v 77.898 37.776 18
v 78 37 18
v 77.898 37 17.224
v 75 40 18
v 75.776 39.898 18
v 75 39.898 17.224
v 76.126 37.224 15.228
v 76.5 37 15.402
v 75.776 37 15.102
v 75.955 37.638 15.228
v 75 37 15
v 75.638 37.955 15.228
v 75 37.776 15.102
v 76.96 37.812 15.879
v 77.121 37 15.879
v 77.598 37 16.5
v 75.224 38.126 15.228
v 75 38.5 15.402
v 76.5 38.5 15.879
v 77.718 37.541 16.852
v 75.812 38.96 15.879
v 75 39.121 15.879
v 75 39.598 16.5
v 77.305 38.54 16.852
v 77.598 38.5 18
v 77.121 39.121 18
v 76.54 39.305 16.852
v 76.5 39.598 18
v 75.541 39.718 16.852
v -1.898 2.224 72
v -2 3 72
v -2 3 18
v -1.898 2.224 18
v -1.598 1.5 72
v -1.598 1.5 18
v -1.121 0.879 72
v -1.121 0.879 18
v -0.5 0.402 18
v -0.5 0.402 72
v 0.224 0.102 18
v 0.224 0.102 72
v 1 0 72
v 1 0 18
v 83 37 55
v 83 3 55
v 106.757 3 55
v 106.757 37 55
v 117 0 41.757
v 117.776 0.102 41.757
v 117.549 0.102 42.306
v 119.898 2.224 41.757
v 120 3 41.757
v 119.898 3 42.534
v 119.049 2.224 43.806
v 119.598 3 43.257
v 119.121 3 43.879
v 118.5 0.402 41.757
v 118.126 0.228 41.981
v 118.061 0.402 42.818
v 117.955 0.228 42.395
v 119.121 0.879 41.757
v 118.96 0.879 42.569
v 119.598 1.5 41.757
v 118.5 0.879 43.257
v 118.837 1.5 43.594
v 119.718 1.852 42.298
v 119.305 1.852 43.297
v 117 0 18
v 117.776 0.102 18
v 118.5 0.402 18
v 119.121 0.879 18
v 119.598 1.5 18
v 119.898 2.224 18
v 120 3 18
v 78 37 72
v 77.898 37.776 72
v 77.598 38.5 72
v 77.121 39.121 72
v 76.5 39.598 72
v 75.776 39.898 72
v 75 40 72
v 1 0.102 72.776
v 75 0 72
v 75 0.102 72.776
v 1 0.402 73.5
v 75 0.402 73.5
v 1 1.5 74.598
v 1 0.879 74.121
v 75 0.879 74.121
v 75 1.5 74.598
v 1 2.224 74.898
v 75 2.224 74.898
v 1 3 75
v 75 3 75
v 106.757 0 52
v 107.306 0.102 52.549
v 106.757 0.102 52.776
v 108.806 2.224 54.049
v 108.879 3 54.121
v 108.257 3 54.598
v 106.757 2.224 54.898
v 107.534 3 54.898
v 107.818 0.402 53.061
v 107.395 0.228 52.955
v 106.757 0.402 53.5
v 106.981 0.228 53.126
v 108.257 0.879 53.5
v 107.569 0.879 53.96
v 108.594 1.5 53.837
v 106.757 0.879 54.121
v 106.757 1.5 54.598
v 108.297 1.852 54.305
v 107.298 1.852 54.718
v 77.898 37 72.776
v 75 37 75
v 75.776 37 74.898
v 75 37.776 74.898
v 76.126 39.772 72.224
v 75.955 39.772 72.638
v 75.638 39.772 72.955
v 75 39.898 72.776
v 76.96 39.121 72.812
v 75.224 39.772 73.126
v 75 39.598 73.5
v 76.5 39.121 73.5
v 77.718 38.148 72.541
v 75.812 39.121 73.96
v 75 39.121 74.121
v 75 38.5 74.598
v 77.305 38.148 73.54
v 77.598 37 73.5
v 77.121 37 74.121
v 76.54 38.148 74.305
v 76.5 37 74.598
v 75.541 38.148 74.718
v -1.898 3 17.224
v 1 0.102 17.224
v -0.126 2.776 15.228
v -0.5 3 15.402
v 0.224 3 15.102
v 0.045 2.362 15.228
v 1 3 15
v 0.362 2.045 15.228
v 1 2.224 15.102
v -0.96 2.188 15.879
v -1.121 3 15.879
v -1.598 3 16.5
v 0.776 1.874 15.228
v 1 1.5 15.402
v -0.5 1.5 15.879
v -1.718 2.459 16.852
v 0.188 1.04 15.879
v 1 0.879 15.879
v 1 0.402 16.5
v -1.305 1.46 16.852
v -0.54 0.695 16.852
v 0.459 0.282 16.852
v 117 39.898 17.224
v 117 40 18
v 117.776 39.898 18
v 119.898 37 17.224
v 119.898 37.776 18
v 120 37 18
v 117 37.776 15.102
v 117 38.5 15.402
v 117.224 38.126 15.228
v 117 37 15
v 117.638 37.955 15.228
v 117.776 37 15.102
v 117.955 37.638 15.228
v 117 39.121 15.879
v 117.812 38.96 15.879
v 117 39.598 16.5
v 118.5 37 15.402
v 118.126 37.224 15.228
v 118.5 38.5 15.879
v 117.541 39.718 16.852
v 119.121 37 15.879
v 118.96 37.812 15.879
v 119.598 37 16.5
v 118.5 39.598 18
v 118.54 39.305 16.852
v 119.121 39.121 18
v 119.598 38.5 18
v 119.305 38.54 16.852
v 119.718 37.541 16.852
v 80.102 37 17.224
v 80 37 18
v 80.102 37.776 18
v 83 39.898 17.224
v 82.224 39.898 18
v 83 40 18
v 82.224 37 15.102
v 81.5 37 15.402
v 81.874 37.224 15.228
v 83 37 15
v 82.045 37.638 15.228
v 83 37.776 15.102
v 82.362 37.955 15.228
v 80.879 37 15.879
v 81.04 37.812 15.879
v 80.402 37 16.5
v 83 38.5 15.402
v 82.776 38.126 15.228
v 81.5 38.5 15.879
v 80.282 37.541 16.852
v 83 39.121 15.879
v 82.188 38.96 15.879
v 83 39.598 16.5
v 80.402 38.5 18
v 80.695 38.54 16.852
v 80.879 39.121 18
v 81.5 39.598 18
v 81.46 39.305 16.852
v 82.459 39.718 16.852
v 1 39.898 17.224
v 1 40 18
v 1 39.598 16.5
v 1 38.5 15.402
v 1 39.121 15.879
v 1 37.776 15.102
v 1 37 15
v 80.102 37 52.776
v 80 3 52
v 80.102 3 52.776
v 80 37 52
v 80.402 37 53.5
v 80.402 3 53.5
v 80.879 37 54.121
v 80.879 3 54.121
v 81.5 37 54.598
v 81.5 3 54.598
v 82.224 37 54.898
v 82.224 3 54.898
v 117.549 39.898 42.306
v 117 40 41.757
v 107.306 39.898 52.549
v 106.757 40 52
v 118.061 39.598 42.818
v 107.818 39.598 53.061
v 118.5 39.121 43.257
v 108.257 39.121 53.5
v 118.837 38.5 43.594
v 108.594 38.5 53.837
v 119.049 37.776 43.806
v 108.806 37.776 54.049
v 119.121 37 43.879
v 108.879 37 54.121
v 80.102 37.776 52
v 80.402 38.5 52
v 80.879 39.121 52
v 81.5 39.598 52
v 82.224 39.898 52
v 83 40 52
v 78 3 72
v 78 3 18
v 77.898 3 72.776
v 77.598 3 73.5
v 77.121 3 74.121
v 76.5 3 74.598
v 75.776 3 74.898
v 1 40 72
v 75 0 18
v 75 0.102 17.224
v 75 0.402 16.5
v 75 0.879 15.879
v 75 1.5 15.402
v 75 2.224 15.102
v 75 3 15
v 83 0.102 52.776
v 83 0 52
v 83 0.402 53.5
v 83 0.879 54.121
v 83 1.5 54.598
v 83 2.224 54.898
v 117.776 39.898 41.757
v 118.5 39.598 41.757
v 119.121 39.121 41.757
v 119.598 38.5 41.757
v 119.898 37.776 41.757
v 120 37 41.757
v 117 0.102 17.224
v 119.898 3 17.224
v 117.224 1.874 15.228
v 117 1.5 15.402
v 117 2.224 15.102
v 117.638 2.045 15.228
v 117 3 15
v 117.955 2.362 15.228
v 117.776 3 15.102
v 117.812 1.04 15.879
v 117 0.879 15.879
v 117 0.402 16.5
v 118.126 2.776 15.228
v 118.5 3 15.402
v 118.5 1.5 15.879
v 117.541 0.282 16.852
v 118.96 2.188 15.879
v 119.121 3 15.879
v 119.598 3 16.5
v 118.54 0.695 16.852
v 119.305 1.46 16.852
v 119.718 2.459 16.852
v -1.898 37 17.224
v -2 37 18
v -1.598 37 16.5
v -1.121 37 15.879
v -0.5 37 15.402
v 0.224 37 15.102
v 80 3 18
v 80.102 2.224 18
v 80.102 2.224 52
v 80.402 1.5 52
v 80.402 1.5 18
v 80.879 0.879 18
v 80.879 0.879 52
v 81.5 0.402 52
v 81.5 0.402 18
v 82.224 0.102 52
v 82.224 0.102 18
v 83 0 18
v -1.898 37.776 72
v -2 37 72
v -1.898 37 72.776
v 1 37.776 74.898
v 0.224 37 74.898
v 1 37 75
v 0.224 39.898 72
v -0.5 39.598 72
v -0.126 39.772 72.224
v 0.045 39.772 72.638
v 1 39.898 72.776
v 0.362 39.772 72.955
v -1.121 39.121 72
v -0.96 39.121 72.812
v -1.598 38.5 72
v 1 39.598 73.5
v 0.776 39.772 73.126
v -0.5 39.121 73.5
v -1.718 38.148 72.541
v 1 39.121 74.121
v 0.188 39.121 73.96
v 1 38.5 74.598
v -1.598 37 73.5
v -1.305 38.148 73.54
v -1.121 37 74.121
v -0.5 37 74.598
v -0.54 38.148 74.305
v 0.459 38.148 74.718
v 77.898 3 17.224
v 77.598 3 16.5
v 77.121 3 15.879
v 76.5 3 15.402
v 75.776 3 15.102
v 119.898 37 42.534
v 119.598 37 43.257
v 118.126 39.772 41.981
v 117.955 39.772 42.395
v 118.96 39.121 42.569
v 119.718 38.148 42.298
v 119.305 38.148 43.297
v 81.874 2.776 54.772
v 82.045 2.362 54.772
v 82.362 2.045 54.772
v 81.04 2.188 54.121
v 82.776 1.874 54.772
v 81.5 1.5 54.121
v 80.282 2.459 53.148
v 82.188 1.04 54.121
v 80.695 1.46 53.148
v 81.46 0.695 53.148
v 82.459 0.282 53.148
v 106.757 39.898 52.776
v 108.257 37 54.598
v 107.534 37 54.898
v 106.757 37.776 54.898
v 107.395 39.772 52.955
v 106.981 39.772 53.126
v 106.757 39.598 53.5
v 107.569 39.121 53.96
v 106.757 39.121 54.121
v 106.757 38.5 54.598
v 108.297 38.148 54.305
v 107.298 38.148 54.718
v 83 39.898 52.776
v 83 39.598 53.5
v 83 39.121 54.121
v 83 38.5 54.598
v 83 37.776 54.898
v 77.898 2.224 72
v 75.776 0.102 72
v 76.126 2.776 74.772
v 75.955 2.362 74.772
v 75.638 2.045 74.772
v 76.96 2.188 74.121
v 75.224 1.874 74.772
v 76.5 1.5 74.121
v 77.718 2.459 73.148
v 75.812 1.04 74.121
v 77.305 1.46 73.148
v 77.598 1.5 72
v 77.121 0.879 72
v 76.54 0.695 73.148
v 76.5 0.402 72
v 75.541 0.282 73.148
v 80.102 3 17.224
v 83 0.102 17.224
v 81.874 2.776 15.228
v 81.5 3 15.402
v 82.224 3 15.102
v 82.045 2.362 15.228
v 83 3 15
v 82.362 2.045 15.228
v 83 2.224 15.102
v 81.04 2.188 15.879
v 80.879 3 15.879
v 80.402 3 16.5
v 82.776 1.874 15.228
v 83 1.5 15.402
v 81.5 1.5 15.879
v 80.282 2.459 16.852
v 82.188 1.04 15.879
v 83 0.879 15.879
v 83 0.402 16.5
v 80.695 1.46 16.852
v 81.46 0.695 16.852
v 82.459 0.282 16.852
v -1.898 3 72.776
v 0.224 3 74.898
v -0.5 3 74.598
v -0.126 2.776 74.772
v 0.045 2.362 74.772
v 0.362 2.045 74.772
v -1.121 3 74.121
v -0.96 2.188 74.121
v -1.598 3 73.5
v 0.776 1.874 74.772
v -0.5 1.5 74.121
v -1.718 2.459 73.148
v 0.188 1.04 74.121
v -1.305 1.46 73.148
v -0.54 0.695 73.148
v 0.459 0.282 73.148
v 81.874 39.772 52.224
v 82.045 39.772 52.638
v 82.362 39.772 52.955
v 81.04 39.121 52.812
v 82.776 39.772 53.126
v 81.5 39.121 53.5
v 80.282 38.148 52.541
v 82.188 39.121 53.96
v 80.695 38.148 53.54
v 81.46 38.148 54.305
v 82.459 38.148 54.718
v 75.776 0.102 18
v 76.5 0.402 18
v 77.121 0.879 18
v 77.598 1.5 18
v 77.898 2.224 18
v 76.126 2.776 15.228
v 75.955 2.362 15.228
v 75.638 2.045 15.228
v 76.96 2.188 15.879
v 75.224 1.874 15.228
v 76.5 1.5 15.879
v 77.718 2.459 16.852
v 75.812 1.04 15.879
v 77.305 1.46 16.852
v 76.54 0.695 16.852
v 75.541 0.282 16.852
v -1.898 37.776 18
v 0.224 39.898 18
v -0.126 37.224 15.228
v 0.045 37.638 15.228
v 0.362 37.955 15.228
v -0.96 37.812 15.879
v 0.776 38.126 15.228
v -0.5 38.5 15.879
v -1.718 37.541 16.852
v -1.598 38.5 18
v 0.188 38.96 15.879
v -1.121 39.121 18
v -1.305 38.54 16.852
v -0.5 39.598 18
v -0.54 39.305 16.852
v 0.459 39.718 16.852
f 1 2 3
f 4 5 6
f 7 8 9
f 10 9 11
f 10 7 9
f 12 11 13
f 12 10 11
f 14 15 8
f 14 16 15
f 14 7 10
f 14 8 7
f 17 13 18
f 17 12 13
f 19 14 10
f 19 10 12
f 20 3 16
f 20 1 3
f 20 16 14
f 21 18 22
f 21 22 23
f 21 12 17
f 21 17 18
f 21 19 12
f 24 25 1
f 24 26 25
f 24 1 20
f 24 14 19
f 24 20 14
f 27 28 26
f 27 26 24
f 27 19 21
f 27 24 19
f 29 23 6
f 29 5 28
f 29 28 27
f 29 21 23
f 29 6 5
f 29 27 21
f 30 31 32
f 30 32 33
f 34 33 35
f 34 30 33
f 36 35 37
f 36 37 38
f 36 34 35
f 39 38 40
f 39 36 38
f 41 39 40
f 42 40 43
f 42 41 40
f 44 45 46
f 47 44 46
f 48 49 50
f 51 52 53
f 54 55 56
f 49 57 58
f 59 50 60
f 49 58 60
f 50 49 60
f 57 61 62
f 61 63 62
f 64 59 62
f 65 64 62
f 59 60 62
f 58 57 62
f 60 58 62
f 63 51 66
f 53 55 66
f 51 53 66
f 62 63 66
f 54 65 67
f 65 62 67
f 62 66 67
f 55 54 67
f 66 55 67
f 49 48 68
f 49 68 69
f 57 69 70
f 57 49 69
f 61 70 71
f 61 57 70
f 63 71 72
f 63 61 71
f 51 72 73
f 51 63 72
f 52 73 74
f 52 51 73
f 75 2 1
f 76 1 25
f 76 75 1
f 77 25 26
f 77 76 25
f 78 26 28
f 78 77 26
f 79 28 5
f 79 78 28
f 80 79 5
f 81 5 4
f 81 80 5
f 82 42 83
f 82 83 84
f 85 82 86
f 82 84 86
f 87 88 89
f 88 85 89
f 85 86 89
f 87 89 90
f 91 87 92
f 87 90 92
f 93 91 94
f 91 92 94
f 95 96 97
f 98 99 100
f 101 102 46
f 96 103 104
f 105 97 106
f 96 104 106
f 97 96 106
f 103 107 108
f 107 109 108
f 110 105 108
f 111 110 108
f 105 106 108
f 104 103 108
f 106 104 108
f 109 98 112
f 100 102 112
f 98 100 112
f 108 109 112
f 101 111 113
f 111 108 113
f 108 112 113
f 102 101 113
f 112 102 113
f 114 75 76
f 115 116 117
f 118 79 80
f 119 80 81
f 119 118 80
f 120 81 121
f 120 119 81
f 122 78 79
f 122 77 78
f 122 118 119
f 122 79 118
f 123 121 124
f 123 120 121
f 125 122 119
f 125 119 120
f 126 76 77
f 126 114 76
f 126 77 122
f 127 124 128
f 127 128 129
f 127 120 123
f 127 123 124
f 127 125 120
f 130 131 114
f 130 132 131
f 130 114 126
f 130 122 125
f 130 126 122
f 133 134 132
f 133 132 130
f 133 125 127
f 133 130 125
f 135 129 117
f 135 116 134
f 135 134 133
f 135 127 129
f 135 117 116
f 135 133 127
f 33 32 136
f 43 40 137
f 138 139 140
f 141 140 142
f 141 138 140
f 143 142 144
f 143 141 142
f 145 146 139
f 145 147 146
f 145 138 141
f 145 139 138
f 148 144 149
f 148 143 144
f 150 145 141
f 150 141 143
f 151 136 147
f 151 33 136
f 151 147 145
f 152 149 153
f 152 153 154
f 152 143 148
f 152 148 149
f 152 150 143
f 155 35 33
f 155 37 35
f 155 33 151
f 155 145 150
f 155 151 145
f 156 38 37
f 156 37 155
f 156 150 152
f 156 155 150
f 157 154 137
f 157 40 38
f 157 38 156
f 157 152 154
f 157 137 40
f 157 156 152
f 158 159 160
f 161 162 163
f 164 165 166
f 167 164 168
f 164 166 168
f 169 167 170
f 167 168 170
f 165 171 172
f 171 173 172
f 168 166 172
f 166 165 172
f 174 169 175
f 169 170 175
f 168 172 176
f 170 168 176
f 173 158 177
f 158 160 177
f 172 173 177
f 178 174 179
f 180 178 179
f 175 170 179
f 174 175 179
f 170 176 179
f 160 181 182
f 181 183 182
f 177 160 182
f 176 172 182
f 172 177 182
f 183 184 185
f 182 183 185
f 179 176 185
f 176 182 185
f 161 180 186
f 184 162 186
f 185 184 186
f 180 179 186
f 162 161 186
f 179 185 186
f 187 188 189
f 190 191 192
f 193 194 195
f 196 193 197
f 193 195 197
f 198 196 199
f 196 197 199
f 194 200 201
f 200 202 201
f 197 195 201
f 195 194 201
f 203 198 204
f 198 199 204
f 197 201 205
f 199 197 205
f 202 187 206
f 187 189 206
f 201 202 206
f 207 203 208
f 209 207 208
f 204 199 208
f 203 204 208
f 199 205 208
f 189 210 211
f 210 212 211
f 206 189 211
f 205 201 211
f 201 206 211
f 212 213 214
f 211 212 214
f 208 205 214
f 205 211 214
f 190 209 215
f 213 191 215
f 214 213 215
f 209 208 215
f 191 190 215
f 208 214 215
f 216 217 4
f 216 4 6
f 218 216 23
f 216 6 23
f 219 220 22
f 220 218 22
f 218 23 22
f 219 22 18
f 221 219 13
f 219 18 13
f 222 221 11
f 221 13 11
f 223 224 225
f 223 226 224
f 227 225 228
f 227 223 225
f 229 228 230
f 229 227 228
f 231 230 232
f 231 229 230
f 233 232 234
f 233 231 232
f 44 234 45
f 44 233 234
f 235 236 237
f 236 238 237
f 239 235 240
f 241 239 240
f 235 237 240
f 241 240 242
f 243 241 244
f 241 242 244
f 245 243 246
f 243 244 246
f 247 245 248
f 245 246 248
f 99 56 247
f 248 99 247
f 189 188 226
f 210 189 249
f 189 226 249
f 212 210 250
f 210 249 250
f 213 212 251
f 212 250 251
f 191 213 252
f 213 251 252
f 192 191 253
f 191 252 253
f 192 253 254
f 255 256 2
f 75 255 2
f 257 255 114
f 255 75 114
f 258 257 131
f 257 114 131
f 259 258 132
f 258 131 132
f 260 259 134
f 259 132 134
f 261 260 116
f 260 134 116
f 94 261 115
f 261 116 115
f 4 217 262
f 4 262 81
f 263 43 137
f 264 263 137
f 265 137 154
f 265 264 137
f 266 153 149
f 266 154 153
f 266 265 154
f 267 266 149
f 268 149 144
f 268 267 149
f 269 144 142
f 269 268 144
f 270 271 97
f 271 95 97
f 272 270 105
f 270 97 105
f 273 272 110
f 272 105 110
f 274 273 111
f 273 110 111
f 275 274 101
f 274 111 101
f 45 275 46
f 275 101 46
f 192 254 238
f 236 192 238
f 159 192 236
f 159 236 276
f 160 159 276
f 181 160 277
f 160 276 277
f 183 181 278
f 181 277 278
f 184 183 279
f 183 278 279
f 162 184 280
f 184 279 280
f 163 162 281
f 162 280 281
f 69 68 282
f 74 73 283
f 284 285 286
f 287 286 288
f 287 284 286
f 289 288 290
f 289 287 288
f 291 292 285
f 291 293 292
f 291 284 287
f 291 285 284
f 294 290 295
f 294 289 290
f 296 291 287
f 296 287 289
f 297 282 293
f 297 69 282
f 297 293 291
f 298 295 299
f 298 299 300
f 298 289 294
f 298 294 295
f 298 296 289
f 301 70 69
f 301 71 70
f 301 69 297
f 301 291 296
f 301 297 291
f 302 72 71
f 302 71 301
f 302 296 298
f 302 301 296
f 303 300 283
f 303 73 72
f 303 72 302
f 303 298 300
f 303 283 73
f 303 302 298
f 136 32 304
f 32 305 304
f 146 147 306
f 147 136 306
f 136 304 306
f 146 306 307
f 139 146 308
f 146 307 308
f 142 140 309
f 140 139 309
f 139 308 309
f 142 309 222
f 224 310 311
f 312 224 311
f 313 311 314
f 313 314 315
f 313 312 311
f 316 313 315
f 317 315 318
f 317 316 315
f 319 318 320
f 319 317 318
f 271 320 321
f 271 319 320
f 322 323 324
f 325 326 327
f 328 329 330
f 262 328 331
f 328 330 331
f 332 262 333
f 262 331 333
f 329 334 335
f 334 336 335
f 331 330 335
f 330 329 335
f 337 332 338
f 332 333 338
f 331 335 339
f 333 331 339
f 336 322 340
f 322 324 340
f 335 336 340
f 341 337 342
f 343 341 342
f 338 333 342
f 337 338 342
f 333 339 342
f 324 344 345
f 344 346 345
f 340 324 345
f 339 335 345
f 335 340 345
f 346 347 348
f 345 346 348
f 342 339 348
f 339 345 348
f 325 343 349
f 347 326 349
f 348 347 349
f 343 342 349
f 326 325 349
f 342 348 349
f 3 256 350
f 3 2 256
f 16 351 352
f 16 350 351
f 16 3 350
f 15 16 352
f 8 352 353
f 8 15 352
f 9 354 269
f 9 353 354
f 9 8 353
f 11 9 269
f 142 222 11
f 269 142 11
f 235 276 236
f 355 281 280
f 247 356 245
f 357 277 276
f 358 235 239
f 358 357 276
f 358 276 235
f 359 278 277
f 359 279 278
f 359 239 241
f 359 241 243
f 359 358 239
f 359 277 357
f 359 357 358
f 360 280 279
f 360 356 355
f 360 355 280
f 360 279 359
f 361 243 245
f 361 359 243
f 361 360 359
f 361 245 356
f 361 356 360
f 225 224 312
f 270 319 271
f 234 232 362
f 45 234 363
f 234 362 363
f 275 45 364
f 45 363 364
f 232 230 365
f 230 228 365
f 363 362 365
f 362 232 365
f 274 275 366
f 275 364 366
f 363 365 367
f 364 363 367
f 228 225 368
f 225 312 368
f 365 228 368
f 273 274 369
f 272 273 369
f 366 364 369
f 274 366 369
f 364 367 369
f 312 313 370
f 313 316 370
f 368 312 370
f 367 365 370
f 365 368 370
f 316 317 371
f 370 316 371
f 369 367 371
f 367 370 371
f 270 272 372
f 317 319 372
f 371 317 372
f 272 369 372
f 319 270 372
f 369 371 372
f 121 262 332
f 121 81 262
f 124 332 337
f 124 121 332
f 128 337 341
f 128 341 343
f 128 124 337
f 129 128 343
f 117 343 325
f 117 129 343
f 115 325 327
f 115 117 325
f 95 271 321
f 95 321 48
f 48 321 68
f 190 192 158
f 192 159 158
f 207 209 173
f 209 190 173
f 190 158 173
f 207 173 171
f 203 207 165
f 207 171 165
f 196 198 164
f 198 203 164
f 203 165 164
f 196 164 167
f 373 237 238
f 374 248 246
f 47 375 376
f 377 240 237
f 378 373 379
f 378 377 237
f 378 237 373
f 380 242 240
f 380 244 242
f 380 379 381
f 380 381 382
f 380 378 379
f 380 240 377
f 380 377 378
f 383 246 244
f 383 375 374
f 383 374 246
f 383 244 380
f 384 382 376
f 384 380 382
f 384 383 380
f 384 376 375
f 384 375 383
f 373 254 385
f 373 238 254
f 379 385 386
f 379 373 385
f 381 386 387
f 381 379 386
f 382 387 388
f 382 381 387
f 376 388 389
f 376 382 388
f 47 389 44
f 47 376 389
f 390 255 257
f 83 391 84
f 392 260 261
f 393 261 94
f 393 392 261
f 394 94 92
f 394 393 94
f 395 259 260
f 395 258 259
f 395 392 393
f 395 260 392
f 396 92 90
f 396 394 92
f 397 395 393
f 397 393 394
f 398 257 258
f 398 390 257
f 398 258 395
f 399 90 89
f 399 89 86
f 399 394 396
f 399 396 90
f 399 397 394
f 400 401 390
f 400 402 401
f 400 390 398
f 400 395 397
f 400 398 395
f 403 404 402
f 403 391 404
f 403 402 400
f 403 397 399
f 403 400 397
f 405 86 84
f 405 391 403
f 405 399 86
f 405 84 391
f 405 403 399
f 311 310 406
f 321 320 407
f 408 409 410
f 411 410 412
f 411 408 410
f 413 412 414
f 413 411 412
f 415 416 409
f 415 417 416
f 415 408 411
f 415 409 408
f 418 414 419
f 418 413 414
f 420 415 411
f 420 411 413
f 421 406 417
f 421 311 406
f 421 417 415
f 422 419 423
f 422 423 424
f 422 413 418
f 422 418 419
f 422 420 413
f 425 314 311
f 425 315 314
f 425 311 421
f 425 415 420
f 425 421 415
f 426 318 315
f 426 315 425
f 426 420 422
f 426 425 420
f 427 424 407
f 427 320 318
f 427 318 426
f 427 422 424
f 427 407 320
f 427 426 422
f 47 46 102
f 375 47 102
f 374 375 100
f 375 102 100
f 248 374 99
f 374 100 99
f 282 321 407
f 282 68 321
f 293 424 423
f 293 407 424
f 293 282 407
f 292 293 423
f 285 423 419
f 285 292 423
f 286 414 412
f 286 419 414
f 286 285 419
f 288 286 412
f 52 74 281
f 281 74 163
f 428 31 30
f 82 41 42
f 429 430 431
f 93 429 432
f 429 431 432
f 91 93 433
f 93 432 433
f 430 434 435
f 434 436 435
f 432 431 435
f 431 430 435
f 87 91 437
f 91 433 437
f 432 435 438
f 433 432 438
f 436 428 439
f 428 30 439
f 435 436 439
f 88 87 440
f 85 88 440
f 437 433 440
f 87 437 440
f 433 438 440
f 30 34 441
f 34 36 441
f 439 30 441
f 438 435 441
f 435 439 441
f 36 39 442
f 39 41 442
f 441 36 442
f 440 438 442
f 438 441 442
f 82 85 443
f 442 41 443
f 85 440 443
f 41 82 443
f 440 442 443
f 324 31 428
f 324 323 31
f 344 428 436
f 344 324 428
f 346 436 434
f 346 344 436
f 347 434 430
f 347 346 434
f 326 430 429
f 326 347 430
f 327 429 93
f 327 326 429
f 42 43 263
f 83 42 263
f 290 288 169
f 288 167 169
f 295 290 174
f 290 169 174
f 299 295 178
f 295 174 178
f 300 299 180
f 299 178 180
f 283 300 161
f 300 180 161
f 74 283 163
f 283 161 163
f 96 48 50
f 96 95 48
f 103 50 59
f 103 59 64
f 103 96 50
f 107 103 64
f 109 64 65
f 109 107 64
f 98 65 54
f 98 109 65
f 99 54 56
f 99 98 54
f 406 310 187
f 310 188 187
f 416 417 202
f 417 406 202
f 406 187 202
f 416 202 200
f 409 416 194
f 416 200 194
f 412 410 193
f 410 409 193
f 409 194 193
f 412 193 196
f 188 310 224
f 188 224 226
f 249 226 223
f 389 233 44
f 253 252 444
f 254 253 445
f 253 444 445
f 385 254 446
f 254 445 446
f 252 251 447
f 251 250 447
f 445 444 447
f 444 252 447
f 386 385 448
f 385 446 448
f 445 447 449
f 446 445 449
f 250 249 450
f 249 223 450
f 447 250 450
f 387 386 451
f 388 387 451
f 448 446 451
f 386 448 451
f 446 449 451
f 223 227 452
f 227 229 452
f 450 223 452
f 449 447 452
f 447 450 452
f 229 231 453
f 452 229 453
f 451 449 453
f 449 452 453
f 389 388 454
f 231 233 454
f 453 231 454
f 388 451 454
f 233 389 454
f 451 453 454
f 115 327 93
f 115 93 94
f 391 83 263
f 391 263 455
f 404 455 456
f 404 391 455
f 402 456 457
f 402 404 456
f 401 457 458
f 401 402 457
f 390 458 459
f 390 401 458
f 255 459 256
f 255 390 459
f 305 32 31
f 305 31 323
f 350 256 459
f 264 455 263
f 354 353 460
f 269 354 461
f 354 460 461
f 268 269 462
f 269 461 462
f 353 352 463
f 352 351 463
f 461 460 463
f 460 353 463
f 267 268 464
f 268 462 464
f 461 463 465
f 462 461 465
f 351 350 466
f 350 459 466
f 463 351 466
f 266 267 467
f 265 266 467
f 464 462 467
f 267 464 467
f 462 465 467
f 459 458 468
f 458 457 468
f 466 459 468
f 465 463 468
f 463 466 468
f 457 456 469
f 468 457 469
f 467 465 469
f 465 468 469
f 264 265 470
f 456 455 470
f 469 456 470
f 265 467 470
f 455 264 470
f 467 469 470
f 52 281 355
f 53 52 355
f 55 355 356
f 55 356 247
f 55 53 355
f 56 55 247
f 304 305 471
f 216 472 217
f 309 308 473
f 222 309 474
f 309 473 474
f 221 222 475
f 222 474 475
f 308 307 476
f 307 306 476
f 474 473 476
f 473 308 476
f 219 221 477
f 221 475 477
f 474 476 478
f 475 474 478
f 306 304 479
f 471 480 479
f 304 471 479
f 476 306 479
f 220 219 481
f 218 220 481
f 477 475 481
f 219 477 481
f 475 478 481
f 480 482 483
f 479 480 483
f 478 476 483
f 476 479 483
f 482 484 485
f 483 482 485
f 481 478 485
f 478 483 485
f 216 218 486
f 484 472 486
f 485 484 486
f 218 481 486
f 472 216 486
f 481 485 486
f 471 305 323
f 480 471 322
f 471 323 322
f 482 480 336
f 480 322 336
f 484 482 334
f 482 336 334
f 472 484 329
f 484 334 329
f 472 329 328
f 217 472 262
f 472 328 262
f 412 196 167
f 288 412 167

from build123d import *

# Parameters (mm, degrees)
BOX004_W               = 40
BOX004_H               = 40
BOX004_DEPTH           = 40
BOX004_PLACEMENT_ANGLE = 45
BOX003_W               = 40
BOX003_H               = 40
BOX003_DEPTH           = 40
FILLET002_R            = 3
BOX002_W               = 80
BOX002_H               = 40
BOX002_DEPTH           = 60
FILLET001_R            = 3


with BuildPart() as cube004:
    # Box004 → Box004 (new body)
    with BuildSketch(Plane.XY):
        with Locations((20, 20)):
            Rectangle(BOX004_W, BOX004_H)
    extrude(amount=BOX004_DEPTH)


with BuildPart() as cube004_1:
    # Box004 placement: moved
    add(cube004.part.moved(Location((102, 0, 41))).rotate(Axis((102, 0, 41), (0, -1, 0)), BOX004_PLACEMENT_ANGLE))


with BuildPart() as part_de_dalt:
    # Box003 → Box003 (new body)
    with BuildSketch(Plane(origin=(60, 0, 15), x_dir=(1, 0, 0), z_dir=(0, 0, 1))):
        with Locations((20, 20)):
            Rectangle(BOX003_W, BOX003_H)
    extrude(amount=BOX003_DEPTH)

    # Cut: cut Cube004
    add(cube004_1.part, mode=Mode.SUBTRACT)


with BuildPart() as part_de_dalt_1:
    # Cut placement: moved
    add(part_de_dalt.part.moved(Location((20, 0, 0))))

    # Fillet002
    fillet002_edges = [part_de_dalt_1.edges().sort_by_distance(p)[0] for p in [
        (80, 0, 35),
        (80, 20, 55),
        (80, 40, 35),
        (80, 20, 15),
        (120, 0, 29),
        (114, 0, 49),
        (94, 0, 55),
        (100, 0, 15),
        (94, 40, 55),
        (108, 20, 55),
        (120, 40, 29),
        (114, 40, 49),
        (100, 40, 15),
        (120, 20, 15),
        (120, 20, 43),
    ]]
    fillet(fillet002_edges, radius=FILLET002_R)


with BuildPart() as fusion005:
    # Box002 → Box002 (new body)
    with BuildSketch(Plane(origin=(-2, 0, 15), x_dir=(1, 0, 0), z_dir=(0, 0, 1))):
        with Locations((40, 20)):
            Rectangle(BOX002_W, BOX002_H)
    extrude(amount=BOX002_DEPTH)

    # Fillet001
    fillet001_edges = [fusion005.edges().sort_by_distance(p)[0] for p in [
        (-2, 0, 45),
        (-2, 20, 75),
        (-2, 40, 45),
        (-2, 20, 15),
        (78, 0, 45),
        (78, 20, 75),
        (78, 40, 45),
        (78, 20, 15),
        (38, 0, 15),
        (38, 0, 75),
        (38, 40, 15),
        (38, 40, 75),
    ]]
    fillet(fillet001_edges, radius=FILLET001_R)

    # Fusion005: union part de dalt
    add(part_de_dalt_1.part)


solid = fusion005.part
